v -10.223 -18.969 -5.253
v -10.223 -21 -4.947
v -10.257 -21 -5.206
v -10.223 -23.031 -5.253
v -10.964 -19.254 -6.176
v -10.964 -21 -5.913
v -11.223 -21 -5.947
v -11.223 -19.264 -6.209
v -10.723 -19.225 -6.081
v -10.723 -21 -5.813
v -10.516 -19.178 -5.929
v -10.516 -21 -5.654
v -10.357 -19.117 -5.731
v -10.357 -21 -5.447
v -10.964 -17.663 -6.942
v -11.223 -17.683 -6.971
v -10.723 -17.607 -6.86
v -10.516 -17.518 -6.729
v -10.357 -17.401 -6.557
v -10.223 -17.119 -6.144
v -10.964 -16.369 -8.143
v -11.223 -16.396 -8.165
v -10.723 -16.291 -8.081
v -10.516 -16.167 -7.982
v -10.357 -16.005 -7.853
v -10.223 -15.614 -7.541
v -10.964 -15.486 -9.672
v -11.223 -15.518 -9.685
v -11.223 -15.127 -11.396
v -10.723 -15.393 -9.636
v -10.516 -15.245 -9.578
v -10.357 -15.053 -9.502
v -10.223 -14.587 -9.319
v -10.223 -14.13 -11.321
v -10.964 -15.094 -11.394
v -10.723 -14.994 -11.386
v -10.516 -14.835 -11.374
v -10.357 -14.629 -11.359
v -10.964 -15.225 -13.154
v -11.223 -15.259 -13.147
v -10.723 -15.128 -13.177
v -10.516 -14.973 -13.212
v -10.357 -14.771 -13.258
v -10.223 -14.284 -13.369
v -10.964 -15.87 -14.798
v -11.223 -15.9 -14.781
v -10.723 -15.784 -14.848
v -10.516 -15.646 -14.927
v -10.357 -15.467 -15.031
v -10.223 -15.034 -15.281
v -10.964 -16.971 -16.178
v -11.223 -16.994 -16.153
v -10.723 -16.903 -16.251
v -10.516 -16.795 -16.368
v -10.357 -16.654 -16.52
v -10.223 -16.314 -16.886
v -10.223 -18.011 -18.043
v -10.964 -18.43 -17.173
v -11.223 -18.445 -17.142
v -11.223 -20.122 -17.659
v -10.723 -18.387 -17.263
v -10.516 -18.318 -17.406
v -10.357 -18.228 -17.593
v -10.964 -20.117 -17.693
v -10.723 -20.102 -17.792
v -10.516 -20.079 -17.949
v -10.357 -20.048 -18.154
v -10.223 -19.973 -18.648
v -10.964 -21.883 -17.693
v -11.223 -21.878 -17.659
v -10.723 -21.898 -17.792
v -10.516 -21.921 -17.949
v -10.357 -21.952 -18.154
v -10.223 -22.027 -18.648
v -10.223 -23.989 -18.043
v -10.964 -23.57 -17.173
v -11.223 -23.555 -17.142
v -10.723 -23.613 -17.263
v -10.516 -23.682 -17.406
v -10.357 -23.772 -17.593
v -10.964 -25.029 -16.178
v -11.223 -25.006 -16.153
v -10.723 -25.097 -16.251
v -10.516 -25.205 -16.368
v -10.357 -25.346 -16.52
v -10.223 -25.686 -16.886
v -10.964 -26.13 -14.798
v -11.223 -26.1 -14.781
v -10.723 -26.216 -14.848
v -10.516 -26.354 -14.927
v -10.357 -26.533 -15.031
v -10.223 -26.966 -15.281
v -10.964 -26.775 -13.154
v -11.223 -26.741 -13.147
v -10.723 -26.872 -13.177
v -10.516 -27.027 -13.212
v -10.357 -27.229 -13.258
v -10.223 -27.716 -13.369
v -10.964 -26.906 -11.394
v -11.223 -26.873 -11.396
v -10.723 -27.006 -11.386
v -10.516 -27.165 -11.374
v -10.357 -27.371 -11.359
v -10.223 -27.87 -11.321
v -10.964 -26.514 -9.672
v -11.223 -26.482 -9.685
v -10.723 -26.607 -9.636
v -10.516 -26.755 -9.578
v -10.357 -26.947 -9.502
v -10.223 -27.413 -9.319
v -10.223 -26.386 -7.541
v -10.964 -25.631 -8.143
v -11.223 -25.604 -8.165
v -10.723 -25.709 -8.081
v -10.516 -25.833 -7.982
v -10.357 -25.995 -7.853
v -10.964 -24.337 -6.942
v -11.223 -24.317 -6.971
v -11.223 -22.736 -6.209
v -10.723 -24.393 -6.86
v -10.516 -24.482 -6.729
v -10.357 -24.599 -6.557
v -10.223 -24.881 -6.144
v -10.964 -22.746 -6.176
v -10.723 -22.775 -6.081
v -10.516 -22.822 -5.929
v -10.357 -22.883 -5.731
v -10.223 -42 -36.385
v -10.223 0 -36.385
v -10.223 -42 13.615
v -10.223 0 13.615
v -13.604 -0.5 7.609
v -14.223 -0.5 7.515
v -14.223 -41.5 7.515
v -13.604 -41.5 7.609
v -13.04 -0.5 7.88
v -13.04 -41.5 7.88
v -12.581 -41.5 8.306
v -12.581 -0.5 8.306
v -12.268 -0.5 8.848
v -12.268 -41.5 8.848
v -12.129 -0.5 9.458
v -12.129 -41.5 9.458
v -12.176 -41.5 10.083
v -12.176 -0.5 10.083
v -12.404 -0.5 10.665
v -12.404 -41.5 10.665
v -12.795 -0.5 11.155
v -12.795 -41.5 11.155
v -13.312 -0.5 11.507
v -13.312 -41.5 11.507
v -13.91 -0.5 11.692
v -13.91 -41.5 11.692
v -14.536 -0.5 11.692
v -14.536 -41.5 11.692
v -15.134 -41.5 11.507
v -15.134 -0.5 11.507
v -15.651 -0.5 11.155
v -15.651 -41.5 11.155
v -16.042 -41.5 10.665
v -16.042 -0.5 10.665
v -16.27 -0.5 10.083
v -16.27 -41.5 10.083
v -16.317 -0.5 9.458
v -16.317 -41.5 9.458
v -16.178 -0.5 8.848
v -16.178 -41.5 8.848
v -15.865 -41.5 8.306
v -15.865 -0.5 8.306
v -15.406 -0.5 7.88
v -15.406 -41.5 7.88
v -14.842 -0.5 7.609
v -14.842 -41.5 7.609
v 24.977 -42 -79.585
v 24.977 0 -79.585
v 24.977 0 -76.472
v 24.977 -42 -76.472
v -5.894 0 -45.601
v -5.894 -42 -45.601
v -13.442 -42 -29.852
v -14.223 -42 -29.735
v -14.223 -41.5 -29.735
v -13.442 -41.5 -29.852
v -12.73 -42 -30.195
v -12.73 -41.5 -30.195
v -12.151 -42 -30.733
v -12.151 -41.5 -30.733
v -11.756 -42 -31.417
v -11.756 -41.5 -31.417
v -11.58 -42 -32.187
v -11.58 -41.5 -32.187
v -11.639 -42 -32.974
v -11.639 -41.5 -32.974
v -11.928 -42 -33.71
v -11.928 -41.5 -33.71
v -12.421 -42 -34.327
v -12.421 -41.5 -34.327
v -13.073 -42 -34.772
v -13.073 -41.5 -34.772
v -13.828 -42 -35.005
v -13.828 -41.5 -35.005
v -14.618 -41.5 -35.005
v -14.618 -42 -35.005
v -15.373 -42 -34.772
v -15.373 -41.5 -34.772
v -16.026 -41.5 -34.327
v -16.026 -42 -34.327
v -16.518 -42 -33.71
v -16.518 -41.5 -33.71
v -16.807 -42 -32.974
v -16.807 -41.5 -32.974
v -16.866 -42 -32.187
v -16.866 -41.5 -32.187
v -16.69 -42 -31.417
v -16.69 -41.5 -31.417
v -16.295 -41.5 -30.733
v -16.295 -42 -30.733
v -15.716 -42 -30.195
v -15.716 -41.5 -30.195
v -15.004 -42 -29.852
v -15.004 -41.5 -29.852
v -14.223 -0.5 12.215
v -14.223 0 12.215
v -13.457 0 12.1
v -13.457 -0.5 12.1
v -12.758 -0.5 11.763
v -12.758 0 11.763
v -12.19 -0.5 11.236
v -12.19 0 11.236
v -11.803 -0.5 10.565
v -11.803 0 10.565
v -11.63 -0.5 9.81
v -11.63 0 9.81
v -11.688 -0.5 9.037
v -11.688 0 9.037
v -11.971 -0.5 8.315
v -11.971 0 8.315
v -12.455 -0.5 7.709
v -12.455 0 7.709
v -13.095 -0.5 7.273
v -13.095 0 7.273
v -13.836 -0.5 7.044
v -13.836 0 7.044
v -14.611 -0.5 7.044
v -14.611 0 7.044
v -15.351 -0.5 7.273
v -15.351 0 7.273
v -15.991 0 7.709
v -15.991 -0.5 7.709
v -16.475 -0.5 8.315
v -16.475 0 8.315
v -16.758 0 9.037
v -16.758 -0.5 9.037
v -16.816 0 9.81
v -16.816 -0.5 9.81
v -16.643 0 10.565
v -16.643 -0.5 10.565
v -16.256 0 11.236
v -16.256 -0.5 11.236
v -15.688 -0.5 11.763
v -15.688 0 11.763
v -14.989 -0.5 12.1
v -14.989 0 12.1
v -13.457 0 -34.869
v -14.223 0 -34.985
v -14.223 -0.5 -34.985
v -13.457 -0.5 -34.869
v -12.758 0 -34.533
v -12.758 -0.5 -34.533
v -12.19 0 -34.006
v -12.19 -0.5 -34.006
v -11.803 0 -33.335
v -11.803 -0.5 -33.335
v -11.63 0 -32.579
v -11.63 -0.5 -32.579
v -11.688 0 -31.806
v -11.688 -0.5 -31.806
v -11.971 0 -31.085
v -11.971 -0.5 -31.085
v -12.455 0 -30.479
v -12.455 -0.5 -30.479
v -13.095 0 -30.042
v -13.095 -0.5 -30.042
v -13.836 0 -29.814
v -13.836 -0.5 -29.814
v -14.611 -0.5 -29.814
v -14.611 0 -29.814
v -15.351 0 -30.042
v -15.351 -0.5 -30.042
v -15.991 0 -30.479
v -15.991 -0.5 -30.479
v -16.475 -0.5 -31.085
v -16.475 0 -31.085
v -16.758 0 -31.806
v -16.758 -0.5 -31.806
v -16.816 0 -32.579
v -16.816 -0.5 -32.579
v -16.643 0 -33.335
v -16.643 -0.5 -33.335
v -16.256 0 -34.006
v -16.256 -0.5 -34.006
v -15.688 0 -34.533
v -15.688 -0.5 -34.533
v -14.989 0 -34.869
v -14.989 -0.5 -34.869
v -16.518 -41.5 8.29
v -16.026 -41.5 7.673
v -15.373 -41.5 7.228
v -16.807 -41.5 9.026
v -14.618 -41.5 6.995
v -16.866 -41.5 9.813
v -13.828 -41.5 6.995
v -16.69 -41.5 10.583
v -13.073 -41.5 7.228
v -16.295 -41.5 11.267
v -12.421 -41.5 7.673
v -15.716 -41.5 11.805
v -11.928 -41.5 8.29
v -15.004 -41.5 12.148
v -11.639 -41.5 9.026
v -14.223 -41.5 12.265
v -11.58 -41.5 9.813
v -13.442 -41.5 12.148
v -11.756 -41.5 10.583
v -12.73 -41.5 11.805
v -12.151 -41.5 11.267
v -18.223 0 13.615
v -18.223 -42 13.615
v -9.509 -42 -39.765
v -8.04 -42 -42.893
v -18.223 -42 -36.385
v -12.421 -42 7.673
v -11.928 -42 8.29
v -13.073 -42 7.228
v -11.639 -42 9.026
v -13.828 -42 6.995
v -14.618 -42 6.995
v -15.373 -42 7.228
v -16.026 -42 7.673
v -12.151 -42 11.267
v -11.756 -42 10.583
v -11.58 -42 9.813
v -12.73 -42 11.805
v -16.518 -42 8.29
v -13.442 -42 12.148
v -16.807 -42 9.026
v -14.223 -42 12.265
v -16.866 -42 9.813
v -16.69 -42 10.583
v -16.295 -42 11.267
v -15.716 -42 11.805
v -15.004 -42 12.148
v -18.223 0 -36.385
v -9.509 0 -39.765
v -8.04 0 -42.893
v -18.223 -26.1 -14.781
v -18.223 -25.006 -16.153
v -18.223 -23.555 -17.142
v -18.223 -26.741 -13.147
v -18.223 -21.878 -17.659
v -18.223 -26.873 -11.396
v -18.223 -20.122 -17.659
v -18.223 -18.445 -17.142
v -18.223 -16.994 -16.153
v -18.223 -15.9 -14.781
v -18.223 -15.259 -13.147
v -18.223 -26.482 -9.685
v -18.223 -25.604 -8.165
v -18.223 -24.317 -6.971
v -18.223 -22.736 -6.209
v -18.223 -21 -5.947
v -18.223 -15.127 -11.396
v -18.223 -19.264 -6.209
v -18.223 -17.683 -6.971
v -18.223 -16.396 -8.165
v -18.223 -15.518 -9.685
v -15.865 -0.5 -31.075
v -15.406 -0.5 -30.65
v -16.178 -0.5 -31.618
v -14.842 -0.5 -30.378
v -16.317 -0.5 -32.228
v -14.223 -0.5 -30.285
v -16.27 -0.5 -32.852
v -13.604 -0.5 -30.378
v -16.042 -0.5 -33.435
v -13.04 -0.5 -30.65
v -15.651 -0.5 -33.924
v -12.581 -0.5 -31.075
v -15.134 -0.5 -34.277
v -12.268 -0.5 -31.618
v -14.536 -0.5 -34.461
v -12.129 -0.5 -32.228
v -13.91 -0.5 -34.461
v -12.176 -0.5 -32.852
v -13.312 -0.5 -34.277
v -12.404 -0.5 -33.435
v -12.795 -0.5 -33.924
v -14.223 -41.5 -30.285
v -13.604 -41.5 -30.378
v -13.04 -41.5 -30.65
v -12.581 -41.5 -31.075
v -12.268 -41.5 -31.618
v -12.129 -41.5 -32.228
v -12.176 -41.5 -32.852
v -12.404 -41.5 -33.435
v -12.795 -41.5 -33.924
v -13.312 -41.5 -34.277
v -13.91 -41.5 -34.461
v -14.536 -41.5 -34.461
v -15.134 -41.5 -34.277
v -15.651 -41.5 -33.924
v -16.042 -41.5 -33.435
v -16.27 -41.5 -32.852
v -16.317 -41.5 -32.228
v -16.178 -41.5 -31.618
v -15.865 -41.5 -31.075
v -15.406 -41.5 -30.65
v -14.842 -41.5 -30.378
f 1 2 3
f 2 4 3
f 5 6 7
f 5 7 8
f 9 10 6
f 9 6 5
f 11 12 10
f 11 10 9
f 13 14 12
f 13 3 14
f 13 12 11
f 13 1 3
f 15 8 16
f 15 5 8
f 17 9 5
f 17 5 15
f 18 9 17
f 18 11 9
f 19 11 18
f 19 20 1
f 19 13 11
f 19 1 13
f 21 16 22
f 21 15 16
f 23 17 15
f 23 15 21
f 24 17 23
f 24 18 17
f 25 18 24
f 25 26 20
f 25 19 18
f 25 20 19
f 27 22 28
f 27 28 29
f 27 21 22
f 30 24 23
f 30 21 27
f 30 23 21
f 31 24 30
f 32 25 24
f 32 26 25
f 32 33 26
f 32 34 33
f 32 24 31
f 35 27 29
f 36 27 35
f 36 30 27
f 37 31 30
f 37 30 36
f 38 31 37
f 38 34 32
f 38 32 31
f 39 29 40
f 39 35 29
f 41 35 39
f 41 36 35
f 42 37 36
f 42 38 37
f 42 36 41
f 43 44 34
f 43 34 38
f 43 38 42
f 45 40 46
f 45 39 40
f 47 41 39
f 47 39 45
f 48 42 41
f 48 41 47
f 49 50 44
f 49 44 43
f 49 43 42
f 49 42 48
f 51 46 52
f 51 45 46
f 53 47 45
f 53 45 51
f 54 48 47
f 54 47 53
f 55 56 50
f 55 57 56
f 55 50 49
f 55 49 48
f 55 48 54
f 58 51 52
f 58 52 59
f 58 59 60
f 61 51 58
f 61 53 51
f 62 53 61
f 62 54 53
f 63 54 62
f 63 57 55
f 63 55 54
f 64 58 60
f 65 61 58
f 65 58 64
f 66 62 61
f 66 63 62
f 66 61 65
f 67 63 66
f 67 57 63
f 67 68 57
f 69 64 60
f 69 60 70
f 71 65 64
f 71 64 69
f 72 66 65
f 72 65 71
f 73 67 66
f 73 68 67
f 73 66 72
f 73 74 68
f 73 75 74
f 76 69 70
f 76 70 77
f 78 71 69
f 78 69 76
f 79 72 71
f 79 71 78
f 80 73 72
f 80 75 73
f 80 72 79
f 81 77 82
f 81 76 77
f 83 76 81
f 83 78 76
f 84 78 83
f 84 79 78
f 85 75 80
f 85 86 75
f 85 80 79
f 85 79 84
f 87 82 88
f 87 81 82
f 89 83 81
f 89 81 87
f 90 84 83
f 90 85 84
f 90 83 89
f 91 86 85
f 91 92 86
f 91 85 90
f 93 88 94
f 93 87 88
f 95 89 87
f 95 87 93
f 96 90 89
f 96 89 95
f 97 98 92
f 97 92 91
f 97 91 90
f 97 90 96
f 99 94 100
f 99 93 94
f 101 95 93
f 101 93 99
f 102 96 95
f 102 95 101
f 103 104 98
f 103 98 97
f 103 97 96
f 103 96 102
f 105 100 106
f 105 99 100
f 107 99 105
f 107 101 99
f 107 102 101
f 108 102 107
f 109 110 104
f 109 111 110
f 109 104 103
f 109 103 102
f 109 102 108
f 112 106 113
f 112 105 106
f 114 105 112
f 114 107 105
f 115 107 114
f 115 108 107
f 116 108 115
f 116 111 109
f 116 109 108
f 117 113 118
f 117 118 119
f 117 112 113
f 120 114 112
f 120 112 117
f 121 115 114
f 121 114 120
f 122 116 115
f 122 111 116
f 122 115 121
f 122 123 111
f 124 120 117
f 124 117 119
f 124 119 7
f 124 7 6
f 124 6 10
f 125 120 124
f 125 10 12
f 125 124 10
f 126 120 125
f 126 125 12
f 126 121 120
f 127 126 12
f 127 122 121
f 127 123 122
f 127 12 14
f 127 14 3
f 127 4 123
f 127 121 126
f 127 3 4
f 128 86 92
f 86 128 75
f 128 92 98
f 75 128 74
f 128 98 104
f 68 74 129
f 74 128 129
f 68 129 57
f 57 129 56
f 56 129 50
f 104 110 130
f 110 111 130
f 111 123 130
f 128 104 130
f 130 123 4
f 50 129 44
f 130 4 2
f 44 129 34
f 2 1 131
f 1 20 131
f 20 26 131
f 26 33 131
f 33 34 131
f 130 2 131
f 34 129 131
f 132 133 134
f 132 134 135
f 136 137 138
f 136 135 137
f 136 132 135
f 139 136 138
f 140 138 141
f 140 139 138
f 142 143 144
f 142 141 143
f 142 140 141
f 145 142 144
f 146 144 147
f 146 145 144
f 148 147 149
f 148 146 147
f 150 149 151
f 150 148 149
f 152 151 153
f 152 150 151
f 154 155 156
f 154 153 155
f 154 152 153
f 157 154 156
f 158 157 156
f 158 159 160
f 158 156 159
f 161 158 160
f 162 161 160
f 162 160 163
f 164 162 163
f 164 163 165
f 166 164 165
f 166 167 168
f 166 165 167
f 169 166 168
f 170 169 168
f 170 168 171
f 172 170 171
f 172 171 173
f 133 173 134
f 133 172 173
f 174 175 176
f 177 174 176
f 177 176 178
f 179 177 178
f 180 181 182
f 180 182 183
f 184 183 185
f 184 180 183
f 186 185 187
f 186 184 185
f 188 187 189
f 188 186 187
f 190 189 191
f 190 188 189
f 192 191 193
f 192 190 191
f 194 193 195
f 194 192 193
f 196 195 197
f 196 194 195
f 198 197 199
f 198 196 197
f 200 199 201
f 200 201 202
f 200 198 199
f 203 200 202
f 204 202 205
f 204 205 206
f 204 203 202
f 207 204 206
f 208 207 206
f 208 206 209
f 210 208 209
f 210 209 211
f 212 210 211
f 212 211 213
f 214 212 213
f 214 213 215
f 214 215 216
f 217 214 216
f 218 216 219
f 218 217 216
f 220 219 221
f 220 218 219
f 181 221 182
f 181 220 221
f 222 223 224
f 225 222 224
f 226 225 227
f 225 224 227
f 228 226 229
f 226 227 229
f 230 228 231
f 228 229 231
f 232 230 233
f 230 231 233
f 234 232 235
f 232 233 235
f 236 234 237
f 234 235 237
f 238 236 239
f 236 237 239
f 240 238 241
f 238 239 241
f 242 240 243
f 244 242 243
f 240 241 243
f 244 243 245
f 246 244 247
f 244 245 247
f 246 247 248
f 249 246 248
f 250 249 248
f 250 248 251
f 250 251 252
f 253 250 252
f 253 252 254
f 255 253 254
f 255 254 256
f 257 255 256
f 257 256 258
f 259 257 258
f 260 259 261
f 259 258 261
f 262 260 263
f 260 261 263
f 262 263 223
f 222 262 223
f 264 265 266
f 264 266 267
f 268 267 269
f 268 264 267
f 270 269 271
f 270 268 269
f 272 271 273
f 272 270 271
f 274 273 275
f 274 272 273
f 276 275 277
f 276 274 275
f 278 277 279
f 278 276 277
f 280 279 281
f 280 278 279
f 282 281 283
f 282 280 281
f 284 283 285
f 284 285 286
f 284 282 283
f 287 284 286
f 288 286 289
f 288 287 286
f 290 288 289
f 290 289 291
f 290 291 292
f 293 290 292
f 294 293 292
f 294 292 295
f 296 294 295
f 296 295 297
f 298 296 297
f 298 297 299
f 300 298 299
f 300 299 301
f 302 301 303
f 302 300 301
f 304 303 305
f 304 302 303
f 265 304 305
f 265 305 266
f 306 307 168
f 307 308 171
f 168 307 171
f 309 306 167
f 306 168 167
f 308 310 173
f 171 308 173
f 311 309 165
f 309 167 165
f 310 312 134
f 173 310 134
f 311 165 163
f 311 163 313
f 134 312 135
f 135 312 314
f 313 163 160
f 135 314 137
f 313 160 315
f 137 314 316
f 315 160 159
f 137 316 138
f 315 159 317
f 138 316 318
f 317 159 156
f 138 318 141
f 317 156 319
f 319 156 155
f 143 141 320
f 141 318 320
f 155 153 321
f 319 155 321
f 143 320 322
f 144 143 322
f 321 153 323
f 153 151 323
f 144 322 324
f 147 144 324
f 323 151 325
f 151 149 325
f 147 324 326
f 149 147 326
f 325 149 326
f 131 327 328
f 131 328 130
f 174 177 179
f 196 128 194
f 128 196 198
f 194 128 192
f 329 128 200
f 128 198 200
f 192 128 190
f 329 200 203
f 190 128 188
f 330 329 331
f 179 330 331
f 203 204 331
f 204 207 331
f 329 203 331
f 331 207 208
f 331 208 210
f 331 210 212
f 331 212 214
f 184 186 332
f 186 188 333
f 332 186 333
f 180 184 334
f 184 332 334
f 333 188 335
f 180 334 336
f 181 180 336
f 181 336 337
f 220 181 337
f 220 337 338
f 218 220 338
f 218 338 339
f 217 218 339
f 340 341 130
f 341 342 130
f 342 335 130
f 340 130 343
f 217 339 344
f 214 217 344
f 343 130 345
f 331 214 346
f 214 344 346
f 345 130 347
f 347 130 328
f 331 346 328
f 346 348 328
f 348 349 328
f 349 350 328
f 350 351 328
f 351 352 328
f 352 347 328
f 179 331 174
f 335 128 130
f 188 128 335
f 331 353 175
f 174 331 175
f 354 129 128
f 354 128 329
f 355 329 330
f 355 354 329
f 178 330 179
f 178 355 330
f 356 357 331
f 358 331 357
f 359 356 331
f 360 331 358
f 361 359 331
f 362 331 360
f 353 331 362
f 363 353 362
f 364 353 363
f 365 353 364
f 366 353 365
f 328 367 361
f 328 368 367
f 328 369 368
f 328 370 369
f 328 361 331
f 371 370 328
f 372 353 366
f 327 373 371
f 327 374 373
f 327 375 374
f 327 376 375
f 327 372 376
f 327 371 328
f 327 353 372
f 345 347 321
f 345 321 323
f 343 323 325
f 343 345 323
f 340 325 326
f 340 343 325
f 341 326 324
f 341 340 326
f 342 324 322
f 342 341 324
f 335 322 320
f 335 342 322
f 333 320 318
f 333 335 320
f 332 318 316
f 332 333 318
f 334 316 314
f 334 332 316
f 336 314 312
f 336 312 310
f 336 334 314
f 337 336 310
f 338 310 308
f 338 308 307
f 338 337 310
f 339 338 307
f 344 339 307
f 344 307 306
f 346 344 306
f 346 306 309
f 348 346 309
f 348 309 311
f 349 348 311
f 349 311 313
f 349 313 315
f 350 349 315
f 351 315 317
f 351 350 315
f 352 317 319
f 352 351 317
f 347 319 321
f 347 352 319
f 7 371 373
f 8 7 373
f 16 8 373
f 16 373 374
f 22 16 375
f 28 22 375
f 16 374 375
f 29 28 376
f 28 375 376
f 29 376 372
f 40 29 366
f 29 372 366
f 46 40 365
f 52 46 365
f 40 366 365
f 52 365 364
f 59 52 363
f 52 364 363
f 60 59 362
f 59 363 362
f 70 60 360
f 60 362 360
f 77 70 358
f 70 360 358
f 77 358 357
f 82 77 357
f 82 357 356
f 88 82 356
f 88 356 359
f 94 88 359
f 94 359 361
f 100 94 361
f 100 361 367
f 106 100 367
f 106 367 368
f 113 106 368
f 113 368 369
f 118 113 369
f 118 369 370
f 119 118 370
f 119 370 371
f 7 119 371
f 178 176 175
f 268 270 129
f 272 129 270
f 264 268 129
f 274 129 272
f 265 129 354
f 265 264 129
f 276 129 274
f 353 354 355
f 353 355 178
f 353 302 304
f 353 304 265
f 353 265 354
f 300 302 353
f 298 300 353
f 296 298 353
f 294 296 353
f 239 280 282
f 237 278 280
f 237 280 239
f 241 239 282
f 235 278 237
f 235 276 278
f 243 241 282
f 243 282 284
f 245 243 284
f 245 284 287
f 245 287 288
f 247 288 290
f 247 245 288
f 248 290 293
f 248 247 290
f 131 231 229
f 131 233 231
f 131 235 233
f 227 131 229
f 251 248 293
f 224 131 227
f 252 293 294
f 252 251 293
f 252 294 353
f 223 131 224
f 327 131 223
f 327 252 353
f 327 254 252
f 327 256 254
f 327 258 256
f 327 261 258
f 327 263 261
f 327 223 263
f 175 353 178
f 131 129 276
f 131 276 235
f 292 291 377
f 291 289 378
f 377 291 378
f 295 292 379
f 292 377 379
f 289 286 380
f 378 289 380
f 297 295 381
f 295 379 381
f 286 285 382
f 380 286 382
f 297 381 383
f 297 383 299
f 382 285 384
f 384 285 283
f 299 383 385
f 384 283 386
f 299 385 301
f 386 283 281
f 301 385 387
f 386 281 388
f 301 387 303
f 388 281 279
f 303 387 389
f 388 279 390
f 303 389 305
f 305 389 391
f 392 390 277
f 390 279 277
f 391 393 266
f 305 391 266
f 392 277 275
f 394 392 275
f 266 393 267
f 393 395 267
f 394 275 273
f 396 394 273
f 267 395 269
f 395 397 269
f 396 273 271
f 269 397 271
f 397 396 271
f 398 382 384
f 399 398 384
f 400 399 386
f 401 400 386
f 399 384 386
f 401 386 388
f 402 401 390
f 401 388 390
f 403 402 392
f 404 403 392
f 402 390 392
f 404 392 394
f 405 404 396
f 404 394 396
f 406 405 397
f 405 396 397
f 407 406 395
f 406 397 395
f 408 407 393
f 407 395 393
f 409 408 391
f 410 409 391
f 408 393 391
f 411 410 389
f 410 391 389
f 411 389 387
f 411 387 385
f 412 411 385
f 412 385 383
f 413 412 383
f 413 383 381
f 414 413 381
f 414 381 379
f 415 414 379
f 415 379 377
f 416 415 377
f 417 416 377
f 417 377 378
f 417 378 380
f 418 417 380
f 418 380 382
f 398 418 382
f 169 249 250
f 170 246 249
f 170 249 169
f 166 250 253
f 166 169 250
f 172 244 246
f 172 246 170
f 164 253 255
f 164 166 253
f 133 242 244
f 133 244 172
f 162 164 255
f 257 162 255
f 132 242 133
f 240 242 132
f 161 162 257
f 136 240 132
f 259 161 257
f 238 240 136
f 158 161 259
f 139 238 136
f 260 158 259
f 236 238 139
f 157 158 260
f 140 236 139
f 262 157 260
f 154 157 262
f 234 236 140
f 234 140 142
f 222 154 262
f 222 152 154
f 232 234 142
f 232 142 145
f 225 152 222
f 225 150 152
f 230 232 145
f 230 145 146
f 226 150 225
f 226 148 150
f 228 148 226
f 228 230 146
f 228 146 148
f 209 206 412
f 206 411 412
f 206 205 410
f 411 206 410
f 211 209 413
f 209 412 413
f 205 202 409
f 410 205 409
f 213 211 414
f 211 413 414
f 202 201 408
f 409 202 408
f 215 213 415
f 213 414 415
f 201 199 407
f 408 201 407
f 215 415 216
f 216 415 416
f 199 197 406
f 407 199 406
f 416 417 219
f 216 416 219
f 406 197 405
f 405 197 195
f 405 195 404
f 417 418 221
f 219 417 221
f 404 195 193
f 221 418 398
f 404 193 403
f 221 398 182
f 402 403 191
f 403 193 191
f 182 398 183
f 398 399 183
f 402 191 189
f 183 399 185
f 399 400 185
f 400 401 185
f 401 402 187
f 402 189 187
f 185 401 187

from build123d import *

# Parameters (mm, degrees)
SKETCH1_W           = 25
SKETCH1_H           = 50
SKETCH1_R           = 3.4
BOSS_EXTRUDE1_DEPTH = 3
SKETCH2_W           = 50
SKETCH2_H           = 3
BOSS_EXTRUDE2_DEPTH = 8
SKETCH3_W           = 8
SKETCH3_H           = 50
BOSS_EXTRUDE3_DEPTH = 42
SKETCH4_R           = 2.65
CUT_EXTRUDE1_DEPTH  = 0.5
SKETCH5_R           = 5.888972746
CUT_EXTRUDE2_DEPTH  = 9
FILLET2_R           = 1
SKETCH6_R           = 12.6
BOSS_EXTRUDE4_DEPTH = 2
FILLET4_R           = 1
SKETCH8_R           = 1.589780168
SKETCH8_R_2         = 1.777428262
CUT_EXTRUDE3_DEPTH  = 10
SKETCH9_W           = 49.021678163
SKETCH9_H           = 20.976854622
CUT_EXTRUDE4_DEPTH  = 68.79439129
SKETCH11_R          = 2.1
CUT_EXTRUDE5_DEPTH  = 59.480168703
SKETCH14_R          = 2.6
CUT_EXTRUDE6_DEPTH  = 0.5
BOSS_EXTRUDE5_DEPTH = 42
FILLET5_R           = 15


with BuildPart() as part:
    # Sketch1 → Boss-Extrude1 (new body)
    with BuildSketch(Plane(origin=(0, 0, 0), x_dir=(1, 0, 0), z_dir=(0, 1, 0))):
        with Locations((2.276951673, 11.384758364)):
            Rectangle(SKETCH1_W, SKETCH1_H)
        with Locations(Location((1.276951673, 11.384758364, 0), (0, 0, 270))):
            Circle(SKETCH1_R, mode=Mode.SUBTRACT)
    extrude(amount=BOSS_EXTRUDE1_DEPTH)

    # Sketch2 → Boss-Extrude2 (add)
    with BuildSketch(Plane.ZY.offset(10.223048327)):
        with Locations((-11.384758364, 1.5)):
            Rectangle(SKETCH2_W, SKETCH2_H)
    extrude(amount=BOSS_EXTRUDE2_DEPTH)

    # Sketch3 → Boss-Extrude3 (add)
    with BuildSketch(Plane.XZ):
        with Locations((-14.223048327, -11.384758364)):
            Rectangle(SKETCH3_W, SKETCH3_H)
    extrude(amount=BOSS_EXTRUDE3_DEPTH)

    # Sketch4 → Cut-Extrude1 (cut)
    with BuildSketch(Plane(origin=(0, 3, 0), x_dir=(1, 0, 0), z_dir=(0, 1, 0))):
        with Locations(Location((-14.223048327, 32.384758364, 0), (0, 0, 270))):
            Circle(SKETCH4_R)
        with Locations(Location((-14.223048327, -9.615241636, 0), (0, 0, 270))):
            Circle(SKETCH4_R)
    cut_extrude1 = extrude(amount=-CUT_EXTRUDE1_DEPTH, mode=Mode.SUBTRACT)

    # Mirror1: Cut-Extrude1 across plane
    add(cut_extrude1.mirror(Plane.ZX.offset(-19.5)), mode=Mode.SUBTRACT)

    # Sketch5 → Cut-Extrude2 (cut)
    with BuildSketch(Plane.ZY.offset(18.223048327)):
        with Locations((-11.836279124, -21)):
            Circle(SKETCH5_R)
    extrude(amount=-CUT_EXTRUDE2_DEPTH, mode=Mode.SUBTRACT)

    # Fillet2
    fillet2_edges = [part.edges().sort_by_distance(p)[0] for p in [
        (-10.223048327, -21, -17.72525187),
    ]]
    fillet(fillet2_edges, radius=FILLET2_R)

    # Mirror2: Cut-Extrude1 across plane
    add(cut_extrude1.mirror(Plane.ZY.offset(1.723048327)), mode=Mode.SUBTRACT)

    # Sketch6 → Boss-Extrude4 (add)
    with BuildSketch(Plane(origin=(0, 3, 0), x_dir=(1, 0, 0), z_dir=(0, 1, 0))):
        with BuildLine():
            Line((14.776951673, 5.825082115), (14.776951673, 16.944434614))
            ThreePointArc((14.776951673, 16.944434614), (-13.323048327, 11.384758364), (14.776951673, 5.825082115))
        make_face()
        with Locations(Location((1.276951673, 11.384758364, 0), (0, 0, 270))):
            Circle(SKETCH6_R, mode=Mode.SUBTRACT)
    extrude(amount=BOSS_EXTRUDE4_DEPTH)

    # Fillet4
    # the kernel refuses this fillet: 1 mm, written as the material it takes off along each edge
    with BuildSketch(Plane(origin=(14.776951673, 5, -3.325082115), x_dir=(0, -1, 0), z_dir=(0, 0, -1))) as fillet4_piece_1:
        with BuildLine():
            CenterArc((FILLET4_R, FILLET4_R), FILLET4_R, 180, 90)
            Line((0, FILLET4_R), (0, 0))
            Line((0, 0), (FILLET4_R, 0))
        make_face()
    extrude(amount=16.119352499, mode=Mode.SUBTRACT)

    # Sketch8 → Cut-Extrude3 (cut)
    with BuildSketch(Plane(origin=(0, 3, 0), x_dir=(1, 0, 0), z_dir=(0, 1, 0))):
        with Locations(Location((1.276951673, 19.884758364, 0), (0, 0, 270))):
            Circle(SKETCH8_R)
        with Locations(Location((1.276951673, 2.884758364, 0), (0, 0, 270))):
            Circle(SKETCH8_R_2)
    extrude(amount=-CUT_EXTRUDE3_DEPTH, mode=Mode.SUBTRACT)

    # Sketch9 → Cut-Extrude4 (cut, through all)
    with BuildSketch(Plane.XY.offset(13.615241636)):
        with Locations((-9.733887409, 10.488427311)):
            Rectangle(SKETCH9_W, SKETCH9_H)
    extrude(amount=-CUT_EXTRUDE4_DEPTH, mode=Mode.SUBTRACT)

    # Sketch11 → Cut-Extrude5 (cut, through all)
    with BuildSketch(Plane(origin=(0, 0, 0), x_dir=(1, 0, 0), z_dir=(0, 1, 0))):
        with Locations(Location((-14.223048327, 32.384758364, 0), (0, 0, 270))):
            Circle(SKETCH11_R)
    cut_extrude5 = extrude(amount=-CUT_EXTRUDE5_DEPTH, mode=Mode.SUBTRACT)

    # Mirror3: Cut-Extrude5 across plane
    add(cut_extrude5.mirror(Plane.XY.offset(-11.384758364)), mode=Mode.SUBTRACT)

    # Sketch14 → Cut-Extrude6 (cut)
    with BuildSketch(Plane(origin=(0, 0, 0), x_dir=(1, 0, 0), z_dir=(0, 1, 0))):
        with Locations(Location((-14.223048327, -9.615241636, 0), (0, 0, 270))):
            Circle(SKETCH14_R)
    cut_extrude6 = extrude(amount=-CUT_EXTRUDE6_DEPTH, mode=Mode.SUBTRACT)

    # Mirror4: Cut-Extrude6 across plane
    add(cut_extrude6.mirror(Plane.XY.offset(-11.384758364)), mode=Mode.SUBTRACT)

    # Sketch15 → Boss-Extrude5 (add)
    with BuildSketch(Plane(origin=(0, 0, 0), x_dir=(1, 0, 0), z_dir=(0, 1, 0))):
        Polygon((-18.223048327, 36.384758364), (24.976951673, 79.584758364), (24.976951673, 76.472221629), (-15.110511592, 36.384758364), align=None)
    extrude(amount=-BOSS_EXTRUDE5_DEPTH)

    # Fillet5
    # the kernel refuses this fillet: 15 mm, written as the material it adds along each edge
    with BuildSketch(Plane(origin=(-15.110511592, 0, -36.384758364), x_dir=(1, 0, 0), z_dir=(0, -1, 0))) as fillet5_piece_1:
        with BuildLine():
            CenterArc((19.822892097, 1.390311339), FILLET5_R, 185.31823153, 39.68176847)
            Line((9.216290379, -9.216290379), (0, 0))
            Line((0, 0), (4.887463265, 0))
        make_face()
    extrude(amount=42)


solid = part.part
